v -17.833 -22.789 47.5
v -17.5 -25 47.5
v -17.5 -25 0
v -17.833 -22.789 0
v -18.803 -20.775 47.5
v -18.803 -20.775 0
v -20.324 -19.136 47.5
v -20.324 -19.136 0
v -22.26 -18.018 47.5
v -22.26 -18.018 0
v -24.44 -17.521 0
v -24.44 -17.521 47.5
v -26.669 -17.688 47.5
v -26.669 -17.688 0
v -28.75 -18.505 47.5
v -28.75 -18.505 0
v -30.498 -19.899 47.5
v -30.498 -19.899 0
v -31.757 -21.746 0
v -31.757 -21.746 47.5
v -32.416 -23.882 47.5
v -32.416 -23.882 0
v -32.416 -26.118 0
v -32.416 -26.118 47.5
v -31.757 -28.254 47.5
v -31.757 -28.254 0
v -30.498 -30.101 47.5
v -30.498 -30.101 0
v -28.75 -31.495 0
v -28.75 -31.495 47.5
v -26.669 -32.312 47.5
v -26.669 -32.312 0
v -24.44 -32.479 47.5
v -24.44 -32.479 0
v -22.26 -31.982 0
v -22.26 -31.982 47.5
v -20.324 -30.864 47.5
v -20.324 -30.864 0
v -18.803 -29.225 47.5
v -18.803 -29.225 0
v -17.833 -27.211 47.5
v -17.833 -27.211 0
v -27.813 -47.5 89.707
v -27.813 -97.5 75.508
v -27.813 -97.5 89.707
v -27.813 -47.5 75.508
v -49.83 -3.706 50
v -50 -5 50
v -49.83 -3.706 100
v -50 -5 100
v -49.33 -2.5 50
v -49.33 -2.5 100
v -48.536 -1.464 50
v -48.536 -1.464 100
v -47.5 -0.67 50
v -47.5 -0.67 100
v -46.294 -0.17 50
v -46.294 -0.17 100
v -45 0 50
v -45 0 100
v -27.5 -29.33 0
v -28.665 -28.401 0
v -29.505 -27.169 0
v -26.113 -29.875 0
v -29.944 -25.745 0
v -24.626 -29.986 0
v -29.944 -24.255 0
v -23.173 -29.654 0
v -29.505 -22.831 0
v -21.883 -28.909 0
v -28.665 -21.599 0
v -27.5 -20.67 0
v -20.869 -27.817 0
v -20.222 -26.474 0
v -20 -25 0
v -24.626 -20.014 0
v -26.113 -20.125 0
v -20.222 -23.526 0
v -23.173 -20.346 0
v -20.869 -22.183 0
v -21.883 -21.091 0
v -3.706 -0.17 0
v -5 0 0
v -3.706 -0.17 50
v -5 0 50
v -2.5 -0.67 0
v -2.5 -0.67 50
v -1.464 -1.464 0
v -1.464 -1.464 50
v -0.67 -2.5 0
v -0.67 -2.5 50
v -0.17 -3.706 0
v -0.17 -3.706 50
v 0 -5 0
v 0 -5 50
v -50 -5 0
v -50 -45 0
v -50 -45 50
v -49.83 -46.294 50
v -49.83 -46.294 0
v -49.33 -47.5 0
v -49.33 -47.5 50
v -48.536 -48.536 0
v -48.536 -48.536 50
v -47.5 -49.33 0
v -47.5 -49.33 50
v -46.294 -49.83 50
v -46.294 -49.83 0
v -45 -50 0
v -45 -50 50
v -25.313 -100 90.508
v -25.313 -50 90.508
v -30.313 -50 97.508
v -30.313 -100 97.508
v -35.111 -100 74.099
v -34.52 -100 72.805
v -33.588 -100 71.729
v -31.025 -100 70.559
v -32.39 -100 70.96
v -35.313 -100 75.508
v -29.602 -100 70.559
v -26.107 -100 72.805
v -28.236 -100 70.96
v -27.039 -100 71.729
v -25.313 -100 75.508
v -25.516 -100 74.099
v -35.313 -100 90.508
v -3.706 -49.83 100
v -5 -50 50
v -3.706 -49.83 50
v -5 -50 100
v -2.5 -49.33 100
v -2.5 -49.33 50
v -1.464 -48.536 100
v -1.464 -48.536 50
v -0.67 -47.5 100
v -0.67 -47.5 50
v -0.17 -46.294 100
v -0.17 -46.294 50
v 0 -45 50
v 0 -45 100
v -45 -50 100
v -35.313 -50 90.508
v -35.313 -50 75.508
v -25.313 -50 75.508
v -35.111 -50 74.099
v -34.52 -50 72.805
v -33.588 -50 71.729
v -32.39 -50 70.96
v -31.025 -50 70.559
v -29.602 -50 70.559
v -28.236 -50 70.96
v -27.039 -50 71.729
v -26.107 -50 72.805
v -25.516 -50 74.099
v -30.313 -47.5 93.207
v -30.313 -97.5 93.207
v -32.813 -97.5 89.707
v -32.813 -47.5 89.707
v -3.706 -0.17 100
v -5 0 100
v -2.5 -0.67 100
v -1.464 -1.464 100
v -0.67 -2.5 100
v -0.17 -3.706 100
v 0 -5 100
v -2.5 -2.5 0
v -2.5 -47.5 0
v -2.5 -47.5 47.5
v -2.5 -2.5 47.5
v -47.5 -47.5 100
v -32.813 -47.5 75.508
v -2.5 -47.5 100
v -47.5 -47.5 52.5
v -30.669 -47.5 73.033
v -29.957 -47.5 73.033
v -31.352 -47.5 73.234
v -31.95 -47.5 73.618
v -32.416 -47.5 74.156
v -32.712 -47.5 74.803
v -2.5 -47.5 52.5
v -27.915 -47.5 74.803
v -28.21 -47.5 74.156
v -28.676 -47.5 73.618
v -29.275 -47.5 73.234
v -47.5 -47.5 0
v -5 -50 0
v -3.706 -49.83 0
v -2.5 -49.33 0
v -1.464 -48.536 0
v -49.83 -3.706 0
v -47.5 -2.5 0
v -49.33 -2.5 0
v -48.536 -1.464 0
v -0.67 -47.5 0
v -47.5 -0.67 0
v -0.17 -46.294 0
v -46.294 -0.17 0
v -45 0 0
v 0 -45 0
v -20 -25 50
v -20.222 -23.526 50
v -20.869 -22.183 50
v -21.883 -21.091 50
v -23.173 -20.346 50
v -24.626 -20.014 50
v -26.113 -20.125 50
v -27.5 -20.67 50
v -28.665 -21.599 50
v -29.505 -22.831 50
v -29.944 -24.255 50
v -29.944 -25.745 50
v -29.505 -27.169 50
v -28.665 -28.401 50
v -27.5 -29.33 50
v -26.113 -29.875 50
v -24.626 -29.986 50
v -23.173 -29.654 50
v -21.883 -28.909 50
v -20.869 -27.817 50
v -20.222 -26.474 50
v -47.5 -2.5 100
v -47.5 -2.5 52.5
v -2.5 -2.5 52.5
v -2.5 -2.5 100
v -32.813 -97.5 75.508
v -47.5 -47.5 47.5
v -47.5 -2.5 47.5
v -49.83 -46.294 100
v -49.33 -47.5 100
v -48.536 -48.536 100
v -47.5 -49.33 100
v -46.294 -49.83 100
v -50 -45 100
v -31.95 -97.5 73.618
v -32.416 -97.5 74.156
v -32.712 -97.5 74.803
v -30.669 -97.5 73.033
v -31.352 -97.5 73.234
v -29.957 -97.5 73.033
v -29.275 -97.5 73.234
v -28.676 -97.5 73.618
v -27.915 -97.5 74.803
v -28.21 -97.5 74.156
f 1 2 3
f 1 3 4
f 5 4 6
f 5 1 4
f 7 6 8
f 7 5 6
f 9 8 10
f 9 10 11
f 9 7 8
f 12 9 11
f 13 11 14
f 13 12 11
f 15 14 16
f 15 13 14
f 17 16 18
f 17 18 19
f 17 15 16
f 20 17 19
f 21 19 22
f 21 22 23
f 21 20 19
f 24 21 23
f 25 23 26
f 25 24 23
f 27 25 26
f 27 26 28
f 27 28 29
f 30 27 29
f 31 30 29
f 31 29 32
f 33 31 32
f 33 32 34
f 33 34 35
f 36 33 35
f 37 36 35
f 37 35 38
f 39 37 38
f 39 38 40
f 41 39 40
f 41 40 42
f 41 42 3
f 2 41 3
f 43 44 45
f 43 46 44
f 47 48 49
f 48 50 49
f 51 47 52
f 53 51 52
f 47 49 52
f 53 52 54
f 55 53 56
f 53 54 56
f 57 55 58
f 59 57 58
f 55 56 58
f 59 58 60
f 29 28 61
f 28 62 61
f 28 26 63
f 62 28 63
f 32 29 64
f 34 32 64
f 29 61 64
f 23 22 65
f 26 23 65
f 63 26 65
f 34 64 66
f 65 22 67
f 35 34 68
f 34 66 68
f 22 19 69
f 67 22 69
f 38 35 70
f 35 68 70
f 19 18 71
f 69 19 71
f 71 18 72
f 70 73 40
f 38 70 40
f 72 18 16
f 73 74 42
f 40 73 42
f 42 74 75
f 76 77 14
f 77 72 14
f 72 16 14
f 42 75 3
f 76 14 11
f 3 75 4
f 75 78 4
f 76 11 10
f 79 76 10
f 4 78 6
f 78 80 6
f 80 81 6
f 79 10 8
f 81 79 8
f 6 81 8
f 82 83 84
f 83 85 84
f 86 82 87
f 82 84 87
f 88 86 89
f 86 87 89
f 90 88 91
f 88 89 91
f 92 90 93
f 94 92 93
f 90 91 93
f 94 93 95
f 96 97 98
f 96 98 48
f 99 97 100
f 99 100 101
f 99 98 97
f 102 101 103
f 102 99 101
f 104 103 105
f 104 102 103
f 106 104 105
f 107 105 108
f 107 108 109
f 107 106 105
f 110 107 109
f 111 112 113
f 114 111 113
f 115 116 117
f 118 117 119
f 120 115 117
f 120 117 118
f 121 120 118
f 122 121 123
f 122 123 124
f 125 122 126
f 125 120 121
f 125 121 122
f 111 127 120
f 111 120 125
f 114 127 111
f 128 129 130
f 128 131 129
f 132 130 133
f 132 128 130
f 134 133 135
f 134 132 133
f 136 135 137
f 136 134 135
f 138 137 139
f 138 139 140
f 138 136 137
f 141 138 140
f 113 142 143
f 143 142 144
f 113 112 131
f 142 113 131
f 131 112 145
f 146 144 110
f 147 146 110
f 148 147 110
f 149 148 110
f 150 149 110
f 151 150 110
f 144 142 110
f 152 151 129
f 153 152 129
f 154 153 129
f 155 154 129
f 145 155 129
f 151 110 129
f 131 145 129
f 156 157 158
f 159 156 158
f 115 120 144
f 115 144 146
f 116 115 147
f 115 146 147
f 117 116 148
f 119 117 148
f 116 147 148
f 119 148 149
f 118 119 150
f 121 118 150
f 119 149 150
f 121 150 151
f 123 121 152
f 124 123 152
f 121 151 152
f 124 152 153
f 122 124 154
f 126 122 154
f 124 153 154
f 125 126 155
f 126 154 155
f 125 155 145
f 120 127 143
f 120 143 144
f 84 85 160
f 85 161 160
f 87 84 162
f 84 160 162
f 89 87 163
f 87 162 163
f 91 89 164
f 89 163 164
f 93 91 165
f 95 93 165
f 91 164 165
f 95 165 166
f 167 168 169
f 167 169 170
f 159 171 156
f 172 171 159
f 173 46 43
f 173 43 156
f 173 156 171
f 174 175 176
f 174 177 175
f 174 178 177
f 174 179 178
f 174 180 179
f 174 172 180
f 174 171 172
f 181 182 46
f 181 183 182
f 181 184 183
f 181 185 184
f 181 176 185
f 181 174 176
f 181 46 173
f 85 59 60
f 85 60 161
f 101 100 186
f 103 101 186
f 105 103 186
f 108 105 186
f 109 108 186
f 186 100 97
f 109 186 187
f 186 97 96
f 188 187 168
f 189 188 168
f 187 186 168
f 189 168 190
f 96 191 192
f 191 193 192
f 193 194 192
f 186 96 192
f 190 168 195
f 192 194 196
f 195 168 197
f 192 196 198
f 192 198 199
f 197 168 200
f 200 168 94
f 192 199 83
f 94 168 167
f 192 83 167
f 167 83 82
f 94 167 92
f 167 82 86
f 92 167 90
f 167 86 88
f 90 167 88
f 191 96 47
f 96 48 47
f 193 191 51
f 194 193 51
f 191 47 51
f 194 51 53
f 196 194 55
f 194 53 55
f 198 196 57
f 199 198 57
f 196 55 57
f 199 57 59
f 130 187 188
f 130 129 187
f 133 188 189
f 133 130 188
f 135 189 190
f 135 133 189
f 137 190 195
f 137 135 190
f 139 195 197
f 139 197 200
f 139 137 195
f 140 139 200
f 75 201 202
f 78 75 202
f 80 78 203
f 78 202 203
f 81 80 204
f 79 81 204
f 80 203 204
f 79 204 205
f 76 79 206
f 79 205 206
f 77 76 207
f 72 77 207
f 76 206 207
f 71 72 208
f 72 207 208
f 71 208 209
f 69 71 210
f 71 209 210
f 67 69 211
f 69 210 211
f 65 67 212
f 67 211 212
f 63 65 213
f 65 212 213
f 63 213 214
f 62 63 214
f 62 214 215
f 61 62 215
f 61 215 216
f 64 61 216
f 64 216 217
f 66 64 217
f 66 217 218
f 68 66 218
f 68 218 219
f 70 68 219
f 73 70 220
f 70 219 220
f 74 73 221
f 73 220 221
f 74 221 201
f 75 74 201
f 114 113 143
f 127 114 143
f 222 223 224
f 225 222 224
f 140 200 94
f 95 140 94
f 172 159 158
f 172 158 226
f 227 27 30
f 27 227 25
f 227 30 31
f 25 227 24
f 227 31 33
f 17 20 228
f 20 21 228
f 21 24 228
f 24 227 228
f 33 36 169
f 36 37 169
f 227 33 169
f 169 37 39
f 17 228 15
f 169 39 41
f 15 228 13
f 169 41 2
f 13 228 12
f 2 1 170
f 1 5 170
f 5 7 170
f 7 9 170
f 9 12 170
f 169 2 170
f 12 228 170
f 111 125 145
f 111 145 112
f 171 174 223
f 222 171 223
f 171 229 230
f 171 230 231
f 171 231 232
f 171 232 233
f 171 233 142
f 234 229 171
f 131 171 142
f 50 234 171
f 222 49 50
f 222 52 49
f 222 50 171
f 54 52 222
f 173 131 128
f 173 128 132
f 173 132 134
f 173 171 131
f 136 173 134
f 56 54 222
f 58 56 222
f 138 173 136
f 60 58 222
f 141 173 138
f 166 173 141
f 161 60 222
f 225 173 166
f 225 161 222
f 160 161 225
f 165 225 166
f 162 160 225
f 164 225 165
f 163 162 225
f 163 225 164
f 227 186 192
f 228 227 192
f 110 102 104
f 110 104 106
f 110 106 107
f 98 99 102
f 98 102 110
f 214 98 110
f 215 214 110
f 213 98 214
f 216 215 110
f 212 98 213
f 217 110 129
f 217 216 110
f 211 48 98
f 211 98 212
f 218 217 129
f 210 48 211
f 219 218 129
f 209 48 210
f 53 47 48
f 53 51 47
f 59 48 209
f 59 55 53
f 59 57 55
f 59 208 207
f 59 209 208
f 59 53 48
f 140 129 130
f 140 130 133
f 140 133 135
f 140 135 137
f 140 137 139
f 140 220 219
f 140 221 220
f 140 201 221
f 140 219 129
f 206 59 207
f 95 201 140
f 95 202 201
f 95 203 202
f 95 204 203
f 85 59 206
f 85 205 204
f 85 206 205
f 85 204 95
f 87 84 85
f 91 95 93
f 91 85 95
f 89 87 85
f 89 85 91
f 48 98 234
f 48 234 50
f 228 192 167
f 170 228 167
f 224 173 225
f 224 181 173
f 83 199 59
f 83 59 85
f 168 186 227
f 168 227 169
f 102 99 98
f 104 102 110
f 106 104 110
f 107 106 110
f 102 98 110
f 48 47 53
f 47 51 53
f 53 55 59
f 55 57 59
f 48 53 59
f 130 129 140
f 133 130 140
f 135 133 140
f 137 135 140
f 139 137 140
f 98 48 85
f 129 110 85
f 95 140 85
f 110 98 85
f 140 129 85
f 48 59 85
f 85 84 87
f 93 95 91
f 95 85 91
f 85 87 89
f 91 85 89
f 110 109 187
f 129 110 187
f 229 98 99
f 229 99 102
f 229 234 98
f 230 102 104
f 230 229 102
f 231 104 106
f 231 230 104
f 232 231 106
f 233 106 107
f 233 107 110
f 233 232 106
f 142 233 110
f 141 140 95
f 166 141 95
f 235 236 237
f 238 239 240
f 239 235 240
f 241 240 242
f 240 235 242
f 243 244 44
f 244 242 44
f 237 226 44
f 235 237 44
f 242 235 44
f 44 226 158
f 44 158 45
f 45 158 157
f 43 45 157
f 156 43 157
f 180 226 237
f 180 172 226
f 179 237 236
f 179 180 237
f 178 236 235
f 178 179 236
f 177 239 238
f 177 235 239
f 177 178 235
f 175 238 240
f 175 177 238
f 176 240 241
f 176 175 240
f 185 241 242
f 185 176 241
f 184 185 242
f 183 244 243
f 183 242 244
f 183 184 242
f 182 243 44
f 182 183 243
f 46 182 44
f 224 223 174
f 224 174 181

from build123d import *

# Parameters (mm, degrees)
F0_W     = 50
F0_H     = 50
F1_DEPTH = 50
F2_R     = 5
F3_DEPTH = 50
F4_W     = 50
F4_H     = 50
F5_DEPTH = 50
F7_DEPTH = 50
F8_T     = -2.5
F9_R     = 5
F10_T    = -2.5
F11_R    = 5


with BuildPart() as f1:
    # F0 (on Top) → F1 (new body)
    with BuildSketch(Plane.XY):
        with Locations((-25, -25)):
            Rectangle(F0_W, F0_H)
    extrude(amount=F1_DEPTH)

    # F2 (on face) → F3 (cut)
    with BuildSketch(Plane.XY.offset(50)):
        with Locations((-25, -25)):
            Circle(F2_R)
    extrude(amount=-F3_DEPTH, mode=Mode.SUBTRACT)

    # F8
    f8_openings = [f1.faces().sort_by_distance(p)[0] for p in [
        (-25, -0.707107, 0),
    ]]
    offset(amount=F8_T, openings=f8_openings)

    # F9
    f9_edges = [f1.edges().sort_by_distance(p)[0] for p in [
        (-50, -50, 25),
        (-50, 0, 25),
        (0, -50, 25),
        (0, 0, 25),
    ]]
    fillet(f9_edges, radius=F9_R)


with BuildPart() as f5:
    # F4 (on face) → F5 (new body)
    with BuildSketch(Plane.XY.offset(50)):
        with Locations((-25, -25)):
            Rectangle(F4_W, F4_H)
    extrude(amount=F5_DEPTH)

    # F6 (on face) → F7 (join)
    with BuildSketch(Plane.XZ.offset(50)):
        with BuildLine():
            Line((-30.313282162, 97.5077600479), (-35.313282162, 90.5077600479))
            Line((-35.313282162, 90.5077600479), (-35.313282162, 75.5077600479))
            ThreePointArc((-35.313282162, 75.5077600479), (-30.313282162, 70.5077600479), (-25.313282162, 75.5077600479))
            Line((-25.313282162, 75.5077600479), (-25.313282162, 90.5077600479))
            Line((-25.313282162, 90.5077600479), (-30.313282162, 97.5077600479))
        make_face()
    extrude(amount=F7_DEPTH)

    # F10
    f10_openings = [f5.faces().sort_by_distance(p)[0] for p in [
        (-25, -25, 100),
    ]]
    offset(amount=F10_T, openings=f10_openings, kind=Kind.INTERSECTION)

    # F11
    f11_edges = [f5.edges().sort_by_distance(p)[0] for p in [
        (-50, 0, 75),
        (-50, -50, 75),
        (0, 0, 75),
        (0, -50, 75),
    ]]
    fillet(f11_edges, radius=F11_R)


solid = Compound([f1.part, f5.part])
